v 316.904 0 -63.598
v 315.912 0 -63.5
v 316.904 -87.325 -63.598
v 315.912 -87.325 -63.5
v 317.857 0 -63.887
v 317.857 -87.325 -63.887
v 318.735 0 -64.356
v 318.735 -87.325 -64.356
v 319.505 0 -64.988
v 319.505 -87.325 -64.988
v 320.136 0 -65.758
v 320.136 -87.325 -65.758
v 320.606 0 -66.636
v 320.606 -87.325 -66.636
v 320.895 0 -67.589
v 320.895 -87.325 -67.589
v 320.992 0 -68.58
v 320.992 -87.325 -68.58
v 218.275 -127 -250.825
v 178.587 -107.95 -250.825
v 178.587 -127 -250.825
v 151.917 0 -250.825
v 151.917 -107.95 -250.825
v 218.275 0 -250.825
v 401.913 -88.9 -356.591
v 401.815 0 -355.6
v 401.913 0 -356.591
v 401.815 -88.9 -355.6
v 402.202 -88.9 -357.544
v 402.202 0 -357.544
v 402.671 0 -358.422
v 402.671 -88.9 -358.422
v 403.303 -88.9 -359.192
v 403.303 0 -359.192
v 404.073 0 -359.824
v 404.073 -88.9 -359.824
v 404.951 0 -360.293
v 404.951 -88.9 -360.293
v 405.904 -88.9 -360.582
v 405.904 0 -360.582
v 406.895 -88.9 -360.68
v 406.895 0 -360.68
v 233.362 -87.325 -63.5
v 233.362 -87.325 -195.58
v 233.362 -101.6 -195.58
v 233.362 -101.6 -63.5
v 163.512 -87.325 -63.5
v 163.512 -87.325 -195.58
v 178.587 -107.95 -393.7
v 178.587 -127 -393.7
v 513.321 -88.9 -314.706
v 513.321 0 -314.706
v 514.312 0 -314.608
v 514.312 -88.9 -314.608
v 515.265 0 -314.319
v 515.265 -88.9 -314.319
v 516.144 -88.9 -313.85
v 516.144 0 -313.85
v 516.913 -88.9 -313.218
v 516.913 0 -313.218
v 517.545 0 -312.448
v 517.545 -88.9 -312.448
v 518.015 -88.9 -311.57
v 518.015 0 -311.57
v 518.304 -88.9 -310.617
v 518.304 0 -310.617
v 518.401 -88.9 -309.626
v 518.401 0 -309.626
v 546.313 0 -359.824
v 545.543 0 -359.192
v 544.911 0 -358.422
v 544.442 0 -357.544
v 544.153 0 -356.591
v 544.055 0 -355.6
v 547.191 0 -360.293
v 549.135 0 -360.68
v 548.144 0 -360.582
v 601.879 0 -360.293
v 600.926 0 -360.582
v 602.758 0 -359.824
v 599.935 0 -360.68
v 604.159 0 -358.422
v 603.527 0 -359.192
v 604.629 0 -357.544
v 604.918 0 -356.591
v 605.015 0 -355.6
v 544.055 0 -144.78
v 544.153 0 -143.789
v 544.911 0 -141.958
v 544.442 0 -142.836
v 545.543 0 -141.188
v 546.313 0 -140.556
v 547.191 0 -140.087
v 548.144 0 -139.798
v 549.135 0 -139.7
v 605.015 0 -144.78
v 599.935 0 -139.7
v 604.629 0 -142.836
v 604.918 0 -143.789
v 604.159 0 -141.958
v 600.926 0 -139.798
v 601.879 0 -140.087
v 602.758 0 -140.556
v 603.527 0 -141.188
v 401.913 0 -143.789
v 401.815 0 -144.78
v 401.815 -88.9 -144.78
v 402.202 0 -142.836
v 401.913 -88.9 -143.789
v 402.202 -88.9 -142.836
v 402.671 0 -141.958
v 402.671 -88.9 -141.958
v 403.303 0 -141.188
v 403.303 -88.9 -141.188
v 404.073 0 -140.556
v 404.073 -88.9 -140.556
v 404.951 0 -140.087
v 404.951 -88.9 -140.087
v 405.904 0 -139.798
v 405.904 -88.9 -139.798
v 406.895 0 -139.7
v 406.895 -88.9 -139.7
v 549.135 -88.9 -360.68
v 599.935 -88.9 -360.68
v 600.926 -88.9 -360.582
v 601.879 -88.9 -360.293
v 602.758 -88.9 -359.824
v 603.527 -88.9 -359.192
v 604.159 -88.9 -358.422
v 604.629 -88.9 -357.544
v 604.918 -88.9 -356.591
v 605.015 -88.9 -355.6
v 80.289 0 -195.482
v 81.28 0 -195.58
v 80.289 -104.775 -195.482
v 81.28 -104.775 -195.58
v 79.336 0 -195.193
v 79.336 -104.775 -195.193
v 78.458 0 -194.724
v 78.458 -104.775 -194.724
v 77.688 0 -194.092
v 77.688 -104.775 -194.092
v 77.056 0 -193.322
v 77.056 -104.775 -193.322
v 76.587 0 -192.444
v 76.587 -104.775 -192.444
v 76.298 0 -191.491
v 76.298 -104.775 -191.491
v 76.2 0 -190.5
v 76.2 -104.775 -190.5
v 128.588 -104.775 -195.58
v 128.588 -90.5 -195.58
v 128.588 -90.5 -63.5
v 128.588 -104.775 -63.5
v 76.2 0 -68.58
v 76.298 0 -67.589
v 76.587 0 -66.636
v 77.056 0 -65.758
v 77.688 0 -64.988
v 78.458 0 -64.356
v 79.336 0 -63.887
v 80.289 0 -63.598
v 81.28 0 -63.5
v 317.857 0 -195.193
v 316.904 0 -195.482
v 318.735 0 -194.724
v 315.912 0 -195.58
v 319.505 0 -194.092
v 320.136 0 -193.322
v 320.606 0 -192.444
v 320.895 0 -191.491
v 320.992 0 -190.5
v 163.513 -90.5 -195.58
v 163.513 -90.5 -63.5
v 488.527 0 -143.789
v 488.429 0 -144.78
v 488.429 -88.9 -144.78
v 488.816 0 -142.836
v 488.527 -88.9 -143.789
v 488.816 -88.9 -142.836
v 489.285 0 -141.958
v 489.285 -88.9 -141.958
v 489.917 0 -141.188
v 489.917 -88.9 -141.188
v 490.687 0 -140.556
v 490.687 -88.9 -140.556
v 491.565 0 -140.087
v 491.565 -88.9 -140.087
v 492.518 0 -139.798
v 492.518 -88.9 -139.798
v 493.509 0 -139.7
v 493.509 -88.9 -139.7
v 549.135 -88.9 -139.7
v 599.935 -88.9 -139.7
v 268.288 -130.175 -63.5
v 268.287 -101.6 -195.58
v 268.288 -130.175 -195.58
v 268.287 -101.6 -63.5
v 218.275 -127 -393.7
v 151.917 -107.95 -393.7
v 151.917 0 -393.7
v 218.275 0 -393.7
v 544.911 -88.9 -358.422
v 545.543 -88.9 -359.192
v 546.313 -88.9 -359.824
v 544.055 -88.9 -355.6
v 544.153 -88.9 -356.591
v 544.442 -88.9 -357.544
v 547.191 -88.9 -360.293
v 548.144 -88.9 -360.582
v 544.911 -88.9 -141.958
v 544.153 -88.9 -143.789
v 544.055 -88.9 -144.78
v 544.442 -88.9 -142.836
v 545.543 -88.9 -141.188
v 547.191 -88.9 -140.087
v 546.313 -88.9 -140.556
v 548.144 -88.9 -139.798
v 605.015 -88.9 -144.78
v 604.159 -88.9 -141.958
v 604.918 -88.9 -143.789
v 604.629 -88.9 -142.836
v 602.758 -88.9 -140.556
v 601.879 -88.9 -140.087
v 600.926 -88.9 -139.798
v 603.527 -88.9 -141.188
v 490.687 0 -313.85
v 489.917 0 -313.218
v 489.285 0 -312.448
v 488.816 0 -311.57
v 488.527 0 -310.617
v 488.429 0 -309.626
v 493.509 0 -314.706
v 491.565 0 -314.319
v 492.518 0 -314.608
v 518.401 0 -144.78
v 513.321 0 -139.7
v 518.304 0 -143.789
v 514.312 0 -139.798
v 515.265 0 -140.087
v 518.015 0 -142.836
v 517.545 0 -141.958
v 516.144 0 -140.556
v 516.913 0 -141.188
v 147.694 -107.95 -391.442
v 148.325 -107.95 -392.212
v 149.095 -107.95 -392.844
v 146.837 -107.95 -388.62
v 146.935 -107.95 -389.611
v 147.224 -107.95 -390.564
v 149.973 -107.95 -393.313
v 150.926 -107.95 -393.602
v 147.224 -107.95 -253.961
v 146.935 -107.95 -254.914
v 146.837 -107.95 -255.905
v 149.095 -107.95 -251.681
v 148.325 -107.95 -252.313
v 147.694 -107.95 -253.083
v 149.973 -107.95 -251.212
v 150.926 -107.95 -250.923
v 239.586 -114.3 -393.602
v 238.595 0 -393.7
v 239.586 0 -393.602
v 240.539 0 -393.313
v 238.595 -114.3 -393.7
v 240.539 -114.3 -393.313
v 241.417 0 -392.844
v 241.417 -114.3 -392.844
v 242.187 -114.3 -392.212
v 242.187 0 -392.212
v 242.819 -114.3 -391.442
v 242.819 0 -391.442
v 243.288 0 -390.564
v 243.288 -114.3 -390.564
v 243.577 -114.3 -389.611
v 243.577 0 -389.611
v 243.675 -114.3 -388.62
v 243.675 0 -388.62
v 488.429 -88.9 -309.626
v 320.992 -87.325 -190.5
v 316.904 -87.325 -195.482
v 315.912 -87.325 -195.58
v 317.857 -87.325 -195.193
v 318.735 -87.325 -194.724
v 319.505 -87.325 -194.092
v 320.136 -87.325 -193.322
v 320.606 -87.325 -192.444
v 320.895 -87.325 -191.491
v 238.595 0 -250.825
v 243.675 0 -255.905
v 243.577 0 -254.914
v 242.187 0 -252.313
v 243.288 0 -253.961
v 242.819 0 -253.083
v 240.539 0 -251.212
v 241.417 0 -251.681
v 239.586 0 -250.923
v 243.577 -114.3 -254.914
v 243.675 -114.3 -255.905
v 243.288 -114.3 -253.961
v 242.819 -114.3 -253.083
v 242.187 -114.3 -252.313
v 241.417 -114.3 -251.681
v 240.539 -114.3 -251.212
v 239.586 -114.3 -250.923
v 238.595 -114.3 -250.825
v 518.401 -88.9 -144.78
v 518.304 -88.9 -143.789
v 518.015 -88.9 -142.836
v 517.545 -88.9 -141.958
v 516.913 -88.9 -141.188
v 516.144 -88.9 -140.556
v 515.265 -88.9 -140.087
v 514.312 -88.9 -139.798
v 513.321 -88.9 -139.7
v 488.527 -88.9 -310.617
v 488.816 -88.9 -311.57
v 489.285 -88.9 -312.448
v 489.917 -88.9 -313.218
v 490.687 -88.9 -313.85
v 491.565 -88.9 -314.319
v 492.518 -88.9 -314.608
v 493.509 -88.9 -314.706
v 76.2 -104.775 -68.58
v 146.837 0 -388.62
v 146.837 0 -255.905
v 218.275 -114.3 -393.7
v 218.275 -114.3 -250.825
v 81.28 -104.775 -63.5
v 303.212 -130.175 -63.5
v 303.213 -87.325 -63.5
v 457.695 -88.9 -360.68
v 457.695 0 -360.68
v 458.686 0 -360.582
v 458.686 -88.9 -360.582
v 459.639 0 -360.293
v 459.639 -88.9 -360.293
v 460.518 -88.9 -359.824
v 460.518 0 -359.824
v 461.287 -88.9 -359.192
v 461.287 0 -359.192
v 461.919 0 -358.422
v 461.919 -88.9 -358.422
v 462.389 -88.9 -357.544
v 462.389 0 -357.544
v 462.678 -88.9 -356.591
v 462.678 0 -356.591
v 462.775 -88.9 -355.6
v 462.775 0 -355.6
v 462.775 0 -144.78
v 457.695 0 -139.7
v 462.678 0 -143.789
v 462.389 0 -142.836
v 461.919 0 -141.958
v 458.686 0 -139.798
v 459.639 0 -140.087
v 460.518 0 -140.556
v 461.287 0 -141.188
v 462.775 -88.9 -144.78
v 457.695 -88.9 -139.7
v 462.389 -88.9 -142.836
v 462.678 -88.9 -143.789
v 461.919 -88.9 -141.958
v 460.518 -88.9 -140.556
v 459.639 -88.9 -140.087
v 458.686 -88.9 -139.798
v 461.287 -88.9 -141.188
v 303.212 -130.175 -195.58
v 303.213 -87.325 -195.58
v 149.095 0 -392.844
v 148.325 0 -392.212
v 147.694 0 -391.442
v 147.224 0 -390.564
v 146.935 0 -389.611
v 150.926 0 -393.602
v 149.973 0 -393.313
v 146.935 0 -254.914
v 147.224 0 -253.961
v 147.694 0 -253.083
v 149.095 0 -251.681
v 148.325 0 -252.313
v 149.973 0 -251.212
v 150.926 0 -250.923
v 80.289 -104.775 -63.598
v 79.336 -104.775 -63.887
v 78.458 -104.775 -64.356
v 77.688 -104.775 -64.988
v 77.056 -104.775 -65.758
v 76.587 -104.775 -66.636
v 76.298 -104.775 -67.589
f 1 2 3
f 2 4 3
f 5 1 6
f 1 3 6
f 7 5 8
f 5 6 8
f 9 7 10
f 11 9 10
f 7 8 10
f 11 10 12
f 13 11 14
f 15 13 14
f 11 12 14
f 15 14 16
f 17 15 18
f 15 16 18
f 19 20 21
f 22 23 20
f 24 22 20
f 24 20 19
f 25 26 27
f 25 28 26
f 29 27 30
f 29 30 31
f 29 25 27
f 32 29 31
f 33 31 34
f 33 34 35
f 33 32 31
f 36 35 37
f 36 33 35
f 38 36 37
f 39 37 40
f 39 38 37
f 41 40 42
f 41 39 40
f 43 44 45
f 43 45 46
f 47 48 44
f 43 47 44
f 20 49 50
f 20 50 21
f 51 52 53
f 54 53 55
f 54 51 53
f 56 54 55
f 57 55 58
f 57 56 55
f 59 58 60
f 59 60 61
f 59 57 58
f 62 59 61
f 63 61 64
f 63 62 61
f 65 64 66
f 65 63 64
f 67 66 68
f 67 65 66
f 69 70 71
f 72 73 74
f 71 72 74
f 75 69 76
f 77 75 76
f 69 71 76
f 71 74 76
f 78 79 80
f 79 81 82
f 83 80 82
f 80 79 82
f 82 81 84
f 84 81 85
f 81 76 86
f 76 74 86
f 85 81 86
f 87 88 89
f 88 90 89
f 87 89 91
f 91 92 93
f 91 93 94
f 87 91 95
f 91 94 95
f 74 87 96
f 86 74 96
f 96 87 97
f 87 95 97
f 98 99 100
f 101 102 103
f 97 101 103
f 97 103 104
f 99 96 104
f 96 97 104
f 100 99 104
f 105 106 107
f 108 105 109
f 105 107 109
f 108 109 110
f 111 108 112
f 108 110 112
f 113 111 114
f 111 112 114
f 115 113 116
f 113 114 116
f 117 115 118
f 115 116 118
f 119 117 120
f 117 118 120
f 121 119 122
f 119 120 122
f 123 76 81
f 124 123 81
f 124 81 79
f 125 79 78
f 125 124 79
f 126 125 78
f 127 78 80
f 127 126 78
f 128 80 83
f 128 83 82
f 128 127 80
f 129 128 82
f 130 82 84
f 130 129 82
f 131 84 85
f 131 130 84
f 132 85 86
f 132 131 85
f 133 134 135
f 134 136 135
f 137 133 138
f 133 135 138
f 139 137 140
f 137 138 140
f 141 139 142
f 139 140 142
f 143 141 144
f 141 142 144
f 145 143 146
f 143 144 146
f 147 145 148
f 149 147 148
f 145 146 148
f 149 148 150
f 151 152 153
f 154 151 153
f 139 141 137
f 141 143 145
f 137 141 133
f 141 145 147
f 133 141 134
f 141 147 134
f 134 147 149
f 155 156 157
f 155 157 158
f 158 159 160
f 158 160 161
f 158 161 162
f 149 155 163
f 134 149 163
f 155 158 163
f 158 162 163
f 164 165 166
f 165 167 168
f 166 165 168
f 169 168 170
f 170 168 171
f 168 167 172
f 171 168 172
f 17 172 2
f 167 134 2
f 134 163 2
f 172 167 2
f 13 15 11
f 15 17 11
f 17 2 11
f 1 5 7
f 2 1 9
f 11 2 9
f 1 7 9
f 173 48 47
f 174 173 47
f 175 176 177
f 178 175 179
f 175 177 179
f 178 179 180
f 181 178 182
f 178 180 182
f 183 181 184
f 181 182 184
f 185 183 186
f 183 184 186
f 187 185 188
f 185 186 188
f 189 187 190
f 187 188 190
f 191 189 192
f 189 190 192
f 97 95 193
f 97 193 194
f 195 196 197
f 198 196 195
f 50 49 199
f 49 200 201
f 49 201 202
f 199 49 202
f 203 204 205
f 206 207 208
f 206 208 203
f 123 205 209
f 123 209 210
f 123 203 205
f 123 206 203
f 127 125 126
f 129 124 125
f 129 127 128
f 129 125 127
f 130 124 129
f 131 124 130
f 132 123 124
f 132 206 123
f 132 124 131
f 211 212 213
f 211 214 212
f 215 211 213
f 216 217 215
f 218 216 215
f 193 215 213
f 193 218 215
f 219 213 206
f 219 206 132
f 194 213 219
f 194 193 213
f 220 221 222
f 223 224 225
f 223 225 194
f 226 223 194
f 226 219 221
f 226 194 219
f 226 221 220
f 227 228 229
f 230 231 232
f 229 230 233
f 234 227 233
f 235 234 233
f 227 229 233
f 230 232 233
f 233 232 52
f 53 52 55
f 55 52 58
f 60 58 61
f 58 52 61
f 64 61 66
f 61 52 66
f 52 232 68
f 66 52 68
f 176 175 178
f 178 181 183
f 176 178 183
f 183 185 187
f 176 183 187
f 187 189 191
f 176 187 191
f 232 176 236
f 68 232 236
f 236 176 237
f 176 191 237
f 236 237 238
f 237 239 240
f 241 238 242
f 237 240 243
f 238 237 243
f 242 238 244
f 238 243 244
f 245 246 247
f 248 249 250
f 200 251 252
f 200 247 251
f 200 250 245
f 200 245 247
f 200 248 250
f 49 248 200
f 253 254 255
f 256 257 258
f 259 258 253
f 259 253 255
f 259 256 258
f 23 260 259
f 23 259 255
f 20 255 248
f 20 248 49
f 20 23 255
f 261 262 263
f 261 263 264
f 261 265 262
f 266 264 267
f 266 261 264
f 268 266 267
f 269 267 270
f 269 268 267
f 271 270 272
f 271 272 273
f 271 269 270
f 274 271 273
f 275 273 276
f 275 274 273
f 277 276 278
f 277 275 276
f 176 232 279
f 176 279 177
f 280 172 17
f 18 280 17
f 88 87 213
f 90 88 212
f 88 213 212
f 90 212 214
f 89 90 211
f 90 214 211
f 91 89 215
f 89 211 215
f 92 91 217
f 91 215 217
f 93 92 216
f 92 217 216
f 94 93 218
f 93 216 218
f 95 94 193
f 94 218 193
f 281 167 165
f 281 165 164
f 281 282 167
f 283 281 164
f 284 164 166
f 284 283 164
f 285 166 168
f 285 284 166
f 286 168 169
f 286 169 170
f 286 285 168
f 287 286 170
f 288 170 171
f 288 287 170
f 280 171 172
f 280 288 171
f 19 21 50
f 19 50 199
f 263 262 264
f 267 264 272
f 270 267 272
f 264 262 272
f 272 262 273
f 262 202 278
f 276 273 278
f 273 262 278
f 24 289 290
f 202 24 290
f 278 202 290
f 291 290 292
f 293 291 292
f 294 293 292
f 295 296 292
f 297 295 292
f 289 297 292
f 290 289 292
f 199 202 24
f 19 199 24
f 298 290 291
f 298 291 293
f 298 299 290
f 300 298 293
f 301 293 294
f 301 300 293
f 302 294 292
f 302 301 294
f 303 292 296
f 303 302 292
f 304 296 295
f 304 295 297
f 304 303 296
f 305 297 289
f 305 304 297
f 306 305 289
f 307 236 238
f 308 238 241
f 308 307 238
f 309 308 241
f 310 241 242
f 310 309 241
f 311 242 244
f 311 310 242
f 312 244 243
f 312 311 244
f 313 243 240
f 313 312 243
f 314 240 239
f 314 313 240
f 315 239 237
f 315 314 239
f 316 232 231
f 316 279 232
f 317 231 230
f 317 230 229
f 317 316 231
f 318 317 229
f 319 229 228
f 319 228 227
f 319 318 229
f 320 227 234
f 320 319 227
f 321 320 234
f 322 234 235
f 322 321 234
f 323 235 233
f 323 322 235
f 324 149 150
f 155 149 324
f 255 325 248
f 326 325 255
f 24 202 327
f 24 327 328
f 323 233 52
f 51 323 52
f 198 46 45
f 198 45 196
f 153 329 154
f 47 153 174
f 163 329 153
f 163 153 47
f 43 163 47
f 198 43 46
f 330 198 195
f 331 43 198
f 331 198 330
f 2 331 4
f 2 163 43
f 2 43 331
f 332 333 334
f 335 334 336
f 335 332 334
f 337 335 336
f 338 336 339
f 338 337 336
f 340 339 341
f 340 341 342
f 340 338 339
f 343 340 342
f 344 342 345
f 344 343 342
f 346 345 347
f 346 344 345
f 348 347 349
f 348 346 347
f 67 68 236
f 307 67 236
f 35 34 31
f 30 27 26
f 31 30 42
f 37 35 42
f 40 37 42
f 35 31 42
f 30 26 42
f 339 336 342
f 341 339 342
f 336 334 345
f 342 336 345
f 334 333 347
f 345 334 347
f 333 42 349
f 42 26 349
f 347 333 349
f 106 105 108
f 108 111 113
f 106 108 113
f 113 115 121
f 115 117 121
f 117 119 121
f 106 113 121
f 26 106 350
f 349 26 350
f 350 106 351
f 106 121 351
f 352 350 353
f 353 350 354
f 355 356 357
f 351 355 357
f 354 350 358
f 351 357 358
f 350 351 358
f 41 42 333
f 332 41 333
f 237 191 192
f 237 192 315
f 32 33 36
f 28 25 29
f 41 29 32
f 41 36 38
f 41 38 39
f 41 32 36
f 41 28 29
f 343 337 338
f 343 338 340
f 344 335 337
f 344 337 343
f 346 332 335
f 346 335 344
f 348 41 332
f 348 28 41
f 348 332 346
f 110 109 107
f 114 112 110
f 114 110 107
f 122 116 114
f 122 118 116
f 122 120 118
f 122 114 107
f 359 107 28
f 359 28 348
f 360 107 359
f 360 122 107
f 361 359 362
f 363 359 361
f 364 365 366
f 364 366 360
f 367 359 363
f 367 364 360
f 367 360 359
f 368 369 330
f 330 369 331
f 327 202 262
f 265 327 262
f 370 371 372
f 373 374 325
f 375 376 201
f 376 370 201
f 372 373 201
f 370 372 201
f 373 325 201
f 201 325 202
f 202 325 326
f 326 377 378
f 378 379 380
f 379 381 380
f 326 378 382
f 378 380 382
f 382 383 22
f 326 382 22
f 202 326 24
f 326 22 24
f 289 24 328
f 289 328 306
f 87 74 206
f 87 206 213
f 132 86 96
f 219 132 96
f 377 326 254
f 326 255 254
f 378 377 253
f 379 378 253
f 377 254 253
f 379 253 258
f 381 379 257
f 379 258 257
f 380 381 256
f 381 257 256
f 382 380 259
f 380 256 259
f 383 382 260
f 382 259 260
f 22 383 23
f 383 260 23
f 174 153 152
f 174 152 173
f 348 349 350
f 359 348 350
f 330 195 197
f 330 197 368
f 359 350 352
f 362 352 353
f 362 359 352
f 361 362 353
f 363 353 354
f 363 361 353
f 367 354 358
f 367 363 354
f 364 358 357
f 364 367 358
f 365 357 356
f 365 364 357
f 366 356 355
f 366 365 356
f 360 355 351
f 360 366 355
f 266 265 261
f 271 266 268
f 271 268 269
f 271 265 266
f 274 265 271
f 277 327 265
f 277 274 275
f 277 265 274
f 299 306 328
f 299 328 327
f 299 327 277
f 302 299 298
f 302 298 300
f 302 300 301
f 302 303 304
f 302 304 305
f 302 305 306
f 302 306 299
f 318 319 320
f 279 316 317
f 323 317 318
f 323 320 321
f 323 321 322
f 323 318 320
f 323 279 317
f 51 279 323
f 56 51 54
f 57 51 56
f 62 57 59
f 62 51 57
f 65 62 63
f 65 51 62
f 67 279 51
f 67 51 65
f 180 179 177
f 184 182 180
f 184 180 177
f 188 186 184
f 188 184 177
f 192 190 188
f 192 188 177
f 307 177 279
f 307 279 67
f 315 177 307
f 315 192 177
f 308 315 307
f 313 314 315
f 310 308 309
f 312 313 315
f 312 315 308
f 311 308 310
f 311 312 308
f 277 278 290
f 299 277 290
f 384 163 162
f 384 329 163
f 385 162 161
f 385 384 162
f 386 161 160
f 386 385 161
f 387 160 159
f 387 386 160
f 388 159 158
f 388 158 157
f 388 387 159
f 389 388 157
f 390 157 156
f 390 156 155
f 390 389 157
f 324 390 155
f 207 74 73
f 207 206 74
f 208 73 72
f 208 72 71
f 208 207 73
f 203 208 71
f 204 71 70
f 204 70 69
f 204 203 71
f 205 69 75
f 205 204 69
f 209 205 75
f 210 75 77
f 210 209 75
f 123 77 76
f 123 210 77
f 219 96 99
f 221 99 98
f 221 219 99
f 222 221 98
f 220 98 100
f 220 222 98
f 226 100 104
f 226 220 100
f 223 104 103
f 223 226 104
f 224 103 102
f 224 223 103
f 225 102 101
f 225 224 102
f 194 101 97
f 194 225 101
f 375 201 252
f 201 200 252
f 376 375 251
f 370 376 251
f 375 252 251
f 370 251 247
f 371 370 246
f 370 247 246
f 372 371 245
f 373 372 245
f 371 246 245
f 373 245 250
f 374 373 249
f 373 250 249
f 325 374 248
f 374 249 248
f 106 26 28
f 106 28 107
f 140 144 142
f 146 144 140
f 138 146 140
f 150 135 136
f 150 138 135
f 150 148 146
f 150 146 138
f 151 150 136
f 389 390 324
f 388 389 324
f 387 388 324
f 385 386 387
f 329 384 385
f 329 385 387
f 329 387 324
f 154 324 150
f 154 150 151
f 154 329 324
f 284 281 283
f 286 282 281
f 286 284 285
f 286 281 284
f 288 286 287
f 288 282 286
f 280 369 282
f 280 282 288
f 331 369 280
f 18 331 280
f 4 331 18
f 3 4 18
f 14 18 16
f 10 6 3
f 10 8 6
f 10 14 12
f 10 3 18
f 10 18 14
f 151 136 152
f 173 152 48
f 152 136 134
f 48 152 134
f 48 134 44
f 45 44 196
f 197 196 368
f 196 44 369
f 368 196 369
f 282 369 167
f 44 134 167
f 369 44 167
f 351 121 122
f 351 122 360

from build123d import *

# Parameters (mm, degrees)
F0_W      = 60.96
F0_H      = 220.98
F1_DEPTH  = 88.9
F0_W_2    = 29.972
F0_H_2    = 175.006
F2_R      = 5.08
F2_2_R    = 5.08
F2_3_R    = 5.08
F3_R      = 5.08
F0_W_3    = 52.3875
F0_H_3    = 132.08
F4_DEPTH  = 104.775
F0_W_4    = 34.925
F5_DEPTH  = 90.5002
F0_W_5    = 69.85
F6_DEPTH  = 87.3252
F7_DEPTH  = 101.6
F8_DEPTH  = 130.175
F0_W_6    = 17.78
F9_DEPTH  = 87.3252
F0_W_7    = 31.75
F0_H_4    = 142.875
F10_DEPTH = 107.95
F0_W_8    = 39.6875
F11_DEPTH = 127
F0_W_9    = 25.4
F12_DEPTH = 114.3
F13_R     = 5.08
F13_2_R   = 5.08
F13_3_R   = 5.08


with BuildPart() as f1:
    # F0 (on Front) → F1 (new body)
    with BuildSketch(Plane.XZ):
        with Locations((432.2953, -250.19)):
            Rectangle(F0_W, F0_H)
    extrude(amount=F1_DEPTH)

    # F2
    f2_edges = [f1.edges().sort_by_distance(p)[0] for p in [
        (462.7753, -44.45, -139.7),
        (401.8153, -44.45, -139.7),
        (401.8153, -44.45, -360.68),
        (462.7753, -44.45, -360.68),
    ]]
    fillet(f2_edges, radius=F2_R)


with BuildPart() as f1b:
    # F0 (on Front) → F1, piece 2 (new body)
    with BuildSketch(Plane.XZ):
        with Locations((574.5353, -250.19)):
            Rectangle(F0_W, F0_H)
    extrude(amount=F1_DEPTH)

    # F2#2
    f2_2_edges = [f1b.edges().sort_by_distance(p)[0] for p in [
        (605.0153, -44.45, -139.7),
        (544.0553, -44.45, -139.7),
        (544.0553, -44.45, -360.68),
        (605.0153, -44.45, -360.68),
    ]]
    fillet(f2_2_edges, radius=F2_2_R)


with BuildPart() as f1c:
    # F0 (on Front) → F1, piece 3 (new body)
    with BuildSketch(Plane.XZ):
        with Locations((503.4153, -227.203)):
            Rectangle(F0_W_2, F0_H_2)
    extrude(amount=F1_DEPTH)

    # F2#3
    f2_3_edges = [f1c.edges().sort_by_distance(p)[0] for p in [
        (518.4013, -44.45, -139.7),
        (488.4293, -44.45, -314.706),
        (518.4013, -44.45, -314.706),
    ]]
    fillet(f2_3_edges, radius=F2_3_R)

    # F3
    f3_edges = [f1c.edges().sort_by_distance(p)[0] for p in [
        (488.4293, -44.45, -139.7),
    ]]
    fillet(f3_edges, radius=F3_R)


with BuildPart() as f4:
    # F0 (on Front) → F4 (new body)
    with BuildSketch(Plane.XZ):
        with Locations((102.39375, -129.54)):
            Rectangle(F0_W_3, F0_H_3)
    extrude(amount=F4_DEPTH)

    # F0 (on Front) → F5 (join)
    with BuildSketch(Plane.XZ):
        with Locations((146.05, -129.54)):
            Rectangle(F0_W_4, F0_H_3)
    extrude(amount=F5_DEPTH)

    # F0 (on Front) → F6 (join)
    with BuildSketch(Plane.XZ):
        with Locations((198.4375, -129.54)):
            Rectangle(F0_W_5, F0_H_3)
    extrude(amount=F6_DEPTH)

    # F0 (on Front) → F7 (join)
    with BuildSketch(Plane.XZ):
        with Locations((250.825, -129.54)):
            Rectangle(F0_W_4, F0_H_3)
    extrude(amount=F7_DEPTH)

    # F0 (on Front) → F8 (join)
    with BuildSketch(Plane.XZ):
        with Locations((285.75, -129.54)):
            Rectangle(F0_W_4, F0_H_3)
    extrude(amount=F8_DEPTH)

    # F0 (on Front) → F9 (join)
    with BuildSketch(Plane.XZ):
        with Locations((312.1025, -129.54)):
            Rectangle(F0_W_6, F0_H_3)
    extrude(amount=F9_DEPTH)

    # F13
    f13_edges = [f4.edges().sort_by_distance(p)[0] for p in [
        (320.9925, -43.6626, -63.5),
        (76.2, -52.3875, -63.5),
        (320.9925, -43.6626, -195.58),
        (76.2, -52.3875, -195.58),
    ]]
    fillet(f13_edges, radius=F13_R)


with BuildPart() as f10:
    # F0 (on Front) → F10 (new body)
    with BuildSketch(Plane.XZ):
        with Locations((162.7124, -322.2625)):
            Rectangle(F0_W_7, F0_H_4)
    extrude(amount=F10_DEPTH)

    # F0 (on Front) → F11 (join)
    with BuildSketch(Plane.XZ):
        with Locations((198.43115, -322.2625)):
            Rectangle(F0_W_8, F0_H_4)
    extrude(amount=F11_DEPTH)

    # F13#2
    f13_2_edges = [f10.edges().sort_by_distance(p)[0] for p in [
        (146.8374, -53.975, -250.825),
        (146.8374, -53.975, -393.7),
    ]]
    fillet(f13_2_edges, radius=F13_2_R)


with BuildPart() as f12:
    # F0 (on Front) → F12 (new body)
    with BuildSketch(Plane.XZ):
        with Locations((230.9749, -322.2625)):
            Rectangle(F0_W_9, F0_H_4)
    extrude(amount=F12_DEPTH)

    # F13#3
    f13_3_edges = [f12.edges().sort_by_distance(p)[0] for p in [
        (243.6749, -57.15, -250.825),
        (243.6749, -57.15, -393.7),
    ]]
    fillet(f13_3_edges, radius=F13_3_R)


solid = Compound([f1.part, f1b.part, f1c.part, f4.part, f10.part, f12.part])
